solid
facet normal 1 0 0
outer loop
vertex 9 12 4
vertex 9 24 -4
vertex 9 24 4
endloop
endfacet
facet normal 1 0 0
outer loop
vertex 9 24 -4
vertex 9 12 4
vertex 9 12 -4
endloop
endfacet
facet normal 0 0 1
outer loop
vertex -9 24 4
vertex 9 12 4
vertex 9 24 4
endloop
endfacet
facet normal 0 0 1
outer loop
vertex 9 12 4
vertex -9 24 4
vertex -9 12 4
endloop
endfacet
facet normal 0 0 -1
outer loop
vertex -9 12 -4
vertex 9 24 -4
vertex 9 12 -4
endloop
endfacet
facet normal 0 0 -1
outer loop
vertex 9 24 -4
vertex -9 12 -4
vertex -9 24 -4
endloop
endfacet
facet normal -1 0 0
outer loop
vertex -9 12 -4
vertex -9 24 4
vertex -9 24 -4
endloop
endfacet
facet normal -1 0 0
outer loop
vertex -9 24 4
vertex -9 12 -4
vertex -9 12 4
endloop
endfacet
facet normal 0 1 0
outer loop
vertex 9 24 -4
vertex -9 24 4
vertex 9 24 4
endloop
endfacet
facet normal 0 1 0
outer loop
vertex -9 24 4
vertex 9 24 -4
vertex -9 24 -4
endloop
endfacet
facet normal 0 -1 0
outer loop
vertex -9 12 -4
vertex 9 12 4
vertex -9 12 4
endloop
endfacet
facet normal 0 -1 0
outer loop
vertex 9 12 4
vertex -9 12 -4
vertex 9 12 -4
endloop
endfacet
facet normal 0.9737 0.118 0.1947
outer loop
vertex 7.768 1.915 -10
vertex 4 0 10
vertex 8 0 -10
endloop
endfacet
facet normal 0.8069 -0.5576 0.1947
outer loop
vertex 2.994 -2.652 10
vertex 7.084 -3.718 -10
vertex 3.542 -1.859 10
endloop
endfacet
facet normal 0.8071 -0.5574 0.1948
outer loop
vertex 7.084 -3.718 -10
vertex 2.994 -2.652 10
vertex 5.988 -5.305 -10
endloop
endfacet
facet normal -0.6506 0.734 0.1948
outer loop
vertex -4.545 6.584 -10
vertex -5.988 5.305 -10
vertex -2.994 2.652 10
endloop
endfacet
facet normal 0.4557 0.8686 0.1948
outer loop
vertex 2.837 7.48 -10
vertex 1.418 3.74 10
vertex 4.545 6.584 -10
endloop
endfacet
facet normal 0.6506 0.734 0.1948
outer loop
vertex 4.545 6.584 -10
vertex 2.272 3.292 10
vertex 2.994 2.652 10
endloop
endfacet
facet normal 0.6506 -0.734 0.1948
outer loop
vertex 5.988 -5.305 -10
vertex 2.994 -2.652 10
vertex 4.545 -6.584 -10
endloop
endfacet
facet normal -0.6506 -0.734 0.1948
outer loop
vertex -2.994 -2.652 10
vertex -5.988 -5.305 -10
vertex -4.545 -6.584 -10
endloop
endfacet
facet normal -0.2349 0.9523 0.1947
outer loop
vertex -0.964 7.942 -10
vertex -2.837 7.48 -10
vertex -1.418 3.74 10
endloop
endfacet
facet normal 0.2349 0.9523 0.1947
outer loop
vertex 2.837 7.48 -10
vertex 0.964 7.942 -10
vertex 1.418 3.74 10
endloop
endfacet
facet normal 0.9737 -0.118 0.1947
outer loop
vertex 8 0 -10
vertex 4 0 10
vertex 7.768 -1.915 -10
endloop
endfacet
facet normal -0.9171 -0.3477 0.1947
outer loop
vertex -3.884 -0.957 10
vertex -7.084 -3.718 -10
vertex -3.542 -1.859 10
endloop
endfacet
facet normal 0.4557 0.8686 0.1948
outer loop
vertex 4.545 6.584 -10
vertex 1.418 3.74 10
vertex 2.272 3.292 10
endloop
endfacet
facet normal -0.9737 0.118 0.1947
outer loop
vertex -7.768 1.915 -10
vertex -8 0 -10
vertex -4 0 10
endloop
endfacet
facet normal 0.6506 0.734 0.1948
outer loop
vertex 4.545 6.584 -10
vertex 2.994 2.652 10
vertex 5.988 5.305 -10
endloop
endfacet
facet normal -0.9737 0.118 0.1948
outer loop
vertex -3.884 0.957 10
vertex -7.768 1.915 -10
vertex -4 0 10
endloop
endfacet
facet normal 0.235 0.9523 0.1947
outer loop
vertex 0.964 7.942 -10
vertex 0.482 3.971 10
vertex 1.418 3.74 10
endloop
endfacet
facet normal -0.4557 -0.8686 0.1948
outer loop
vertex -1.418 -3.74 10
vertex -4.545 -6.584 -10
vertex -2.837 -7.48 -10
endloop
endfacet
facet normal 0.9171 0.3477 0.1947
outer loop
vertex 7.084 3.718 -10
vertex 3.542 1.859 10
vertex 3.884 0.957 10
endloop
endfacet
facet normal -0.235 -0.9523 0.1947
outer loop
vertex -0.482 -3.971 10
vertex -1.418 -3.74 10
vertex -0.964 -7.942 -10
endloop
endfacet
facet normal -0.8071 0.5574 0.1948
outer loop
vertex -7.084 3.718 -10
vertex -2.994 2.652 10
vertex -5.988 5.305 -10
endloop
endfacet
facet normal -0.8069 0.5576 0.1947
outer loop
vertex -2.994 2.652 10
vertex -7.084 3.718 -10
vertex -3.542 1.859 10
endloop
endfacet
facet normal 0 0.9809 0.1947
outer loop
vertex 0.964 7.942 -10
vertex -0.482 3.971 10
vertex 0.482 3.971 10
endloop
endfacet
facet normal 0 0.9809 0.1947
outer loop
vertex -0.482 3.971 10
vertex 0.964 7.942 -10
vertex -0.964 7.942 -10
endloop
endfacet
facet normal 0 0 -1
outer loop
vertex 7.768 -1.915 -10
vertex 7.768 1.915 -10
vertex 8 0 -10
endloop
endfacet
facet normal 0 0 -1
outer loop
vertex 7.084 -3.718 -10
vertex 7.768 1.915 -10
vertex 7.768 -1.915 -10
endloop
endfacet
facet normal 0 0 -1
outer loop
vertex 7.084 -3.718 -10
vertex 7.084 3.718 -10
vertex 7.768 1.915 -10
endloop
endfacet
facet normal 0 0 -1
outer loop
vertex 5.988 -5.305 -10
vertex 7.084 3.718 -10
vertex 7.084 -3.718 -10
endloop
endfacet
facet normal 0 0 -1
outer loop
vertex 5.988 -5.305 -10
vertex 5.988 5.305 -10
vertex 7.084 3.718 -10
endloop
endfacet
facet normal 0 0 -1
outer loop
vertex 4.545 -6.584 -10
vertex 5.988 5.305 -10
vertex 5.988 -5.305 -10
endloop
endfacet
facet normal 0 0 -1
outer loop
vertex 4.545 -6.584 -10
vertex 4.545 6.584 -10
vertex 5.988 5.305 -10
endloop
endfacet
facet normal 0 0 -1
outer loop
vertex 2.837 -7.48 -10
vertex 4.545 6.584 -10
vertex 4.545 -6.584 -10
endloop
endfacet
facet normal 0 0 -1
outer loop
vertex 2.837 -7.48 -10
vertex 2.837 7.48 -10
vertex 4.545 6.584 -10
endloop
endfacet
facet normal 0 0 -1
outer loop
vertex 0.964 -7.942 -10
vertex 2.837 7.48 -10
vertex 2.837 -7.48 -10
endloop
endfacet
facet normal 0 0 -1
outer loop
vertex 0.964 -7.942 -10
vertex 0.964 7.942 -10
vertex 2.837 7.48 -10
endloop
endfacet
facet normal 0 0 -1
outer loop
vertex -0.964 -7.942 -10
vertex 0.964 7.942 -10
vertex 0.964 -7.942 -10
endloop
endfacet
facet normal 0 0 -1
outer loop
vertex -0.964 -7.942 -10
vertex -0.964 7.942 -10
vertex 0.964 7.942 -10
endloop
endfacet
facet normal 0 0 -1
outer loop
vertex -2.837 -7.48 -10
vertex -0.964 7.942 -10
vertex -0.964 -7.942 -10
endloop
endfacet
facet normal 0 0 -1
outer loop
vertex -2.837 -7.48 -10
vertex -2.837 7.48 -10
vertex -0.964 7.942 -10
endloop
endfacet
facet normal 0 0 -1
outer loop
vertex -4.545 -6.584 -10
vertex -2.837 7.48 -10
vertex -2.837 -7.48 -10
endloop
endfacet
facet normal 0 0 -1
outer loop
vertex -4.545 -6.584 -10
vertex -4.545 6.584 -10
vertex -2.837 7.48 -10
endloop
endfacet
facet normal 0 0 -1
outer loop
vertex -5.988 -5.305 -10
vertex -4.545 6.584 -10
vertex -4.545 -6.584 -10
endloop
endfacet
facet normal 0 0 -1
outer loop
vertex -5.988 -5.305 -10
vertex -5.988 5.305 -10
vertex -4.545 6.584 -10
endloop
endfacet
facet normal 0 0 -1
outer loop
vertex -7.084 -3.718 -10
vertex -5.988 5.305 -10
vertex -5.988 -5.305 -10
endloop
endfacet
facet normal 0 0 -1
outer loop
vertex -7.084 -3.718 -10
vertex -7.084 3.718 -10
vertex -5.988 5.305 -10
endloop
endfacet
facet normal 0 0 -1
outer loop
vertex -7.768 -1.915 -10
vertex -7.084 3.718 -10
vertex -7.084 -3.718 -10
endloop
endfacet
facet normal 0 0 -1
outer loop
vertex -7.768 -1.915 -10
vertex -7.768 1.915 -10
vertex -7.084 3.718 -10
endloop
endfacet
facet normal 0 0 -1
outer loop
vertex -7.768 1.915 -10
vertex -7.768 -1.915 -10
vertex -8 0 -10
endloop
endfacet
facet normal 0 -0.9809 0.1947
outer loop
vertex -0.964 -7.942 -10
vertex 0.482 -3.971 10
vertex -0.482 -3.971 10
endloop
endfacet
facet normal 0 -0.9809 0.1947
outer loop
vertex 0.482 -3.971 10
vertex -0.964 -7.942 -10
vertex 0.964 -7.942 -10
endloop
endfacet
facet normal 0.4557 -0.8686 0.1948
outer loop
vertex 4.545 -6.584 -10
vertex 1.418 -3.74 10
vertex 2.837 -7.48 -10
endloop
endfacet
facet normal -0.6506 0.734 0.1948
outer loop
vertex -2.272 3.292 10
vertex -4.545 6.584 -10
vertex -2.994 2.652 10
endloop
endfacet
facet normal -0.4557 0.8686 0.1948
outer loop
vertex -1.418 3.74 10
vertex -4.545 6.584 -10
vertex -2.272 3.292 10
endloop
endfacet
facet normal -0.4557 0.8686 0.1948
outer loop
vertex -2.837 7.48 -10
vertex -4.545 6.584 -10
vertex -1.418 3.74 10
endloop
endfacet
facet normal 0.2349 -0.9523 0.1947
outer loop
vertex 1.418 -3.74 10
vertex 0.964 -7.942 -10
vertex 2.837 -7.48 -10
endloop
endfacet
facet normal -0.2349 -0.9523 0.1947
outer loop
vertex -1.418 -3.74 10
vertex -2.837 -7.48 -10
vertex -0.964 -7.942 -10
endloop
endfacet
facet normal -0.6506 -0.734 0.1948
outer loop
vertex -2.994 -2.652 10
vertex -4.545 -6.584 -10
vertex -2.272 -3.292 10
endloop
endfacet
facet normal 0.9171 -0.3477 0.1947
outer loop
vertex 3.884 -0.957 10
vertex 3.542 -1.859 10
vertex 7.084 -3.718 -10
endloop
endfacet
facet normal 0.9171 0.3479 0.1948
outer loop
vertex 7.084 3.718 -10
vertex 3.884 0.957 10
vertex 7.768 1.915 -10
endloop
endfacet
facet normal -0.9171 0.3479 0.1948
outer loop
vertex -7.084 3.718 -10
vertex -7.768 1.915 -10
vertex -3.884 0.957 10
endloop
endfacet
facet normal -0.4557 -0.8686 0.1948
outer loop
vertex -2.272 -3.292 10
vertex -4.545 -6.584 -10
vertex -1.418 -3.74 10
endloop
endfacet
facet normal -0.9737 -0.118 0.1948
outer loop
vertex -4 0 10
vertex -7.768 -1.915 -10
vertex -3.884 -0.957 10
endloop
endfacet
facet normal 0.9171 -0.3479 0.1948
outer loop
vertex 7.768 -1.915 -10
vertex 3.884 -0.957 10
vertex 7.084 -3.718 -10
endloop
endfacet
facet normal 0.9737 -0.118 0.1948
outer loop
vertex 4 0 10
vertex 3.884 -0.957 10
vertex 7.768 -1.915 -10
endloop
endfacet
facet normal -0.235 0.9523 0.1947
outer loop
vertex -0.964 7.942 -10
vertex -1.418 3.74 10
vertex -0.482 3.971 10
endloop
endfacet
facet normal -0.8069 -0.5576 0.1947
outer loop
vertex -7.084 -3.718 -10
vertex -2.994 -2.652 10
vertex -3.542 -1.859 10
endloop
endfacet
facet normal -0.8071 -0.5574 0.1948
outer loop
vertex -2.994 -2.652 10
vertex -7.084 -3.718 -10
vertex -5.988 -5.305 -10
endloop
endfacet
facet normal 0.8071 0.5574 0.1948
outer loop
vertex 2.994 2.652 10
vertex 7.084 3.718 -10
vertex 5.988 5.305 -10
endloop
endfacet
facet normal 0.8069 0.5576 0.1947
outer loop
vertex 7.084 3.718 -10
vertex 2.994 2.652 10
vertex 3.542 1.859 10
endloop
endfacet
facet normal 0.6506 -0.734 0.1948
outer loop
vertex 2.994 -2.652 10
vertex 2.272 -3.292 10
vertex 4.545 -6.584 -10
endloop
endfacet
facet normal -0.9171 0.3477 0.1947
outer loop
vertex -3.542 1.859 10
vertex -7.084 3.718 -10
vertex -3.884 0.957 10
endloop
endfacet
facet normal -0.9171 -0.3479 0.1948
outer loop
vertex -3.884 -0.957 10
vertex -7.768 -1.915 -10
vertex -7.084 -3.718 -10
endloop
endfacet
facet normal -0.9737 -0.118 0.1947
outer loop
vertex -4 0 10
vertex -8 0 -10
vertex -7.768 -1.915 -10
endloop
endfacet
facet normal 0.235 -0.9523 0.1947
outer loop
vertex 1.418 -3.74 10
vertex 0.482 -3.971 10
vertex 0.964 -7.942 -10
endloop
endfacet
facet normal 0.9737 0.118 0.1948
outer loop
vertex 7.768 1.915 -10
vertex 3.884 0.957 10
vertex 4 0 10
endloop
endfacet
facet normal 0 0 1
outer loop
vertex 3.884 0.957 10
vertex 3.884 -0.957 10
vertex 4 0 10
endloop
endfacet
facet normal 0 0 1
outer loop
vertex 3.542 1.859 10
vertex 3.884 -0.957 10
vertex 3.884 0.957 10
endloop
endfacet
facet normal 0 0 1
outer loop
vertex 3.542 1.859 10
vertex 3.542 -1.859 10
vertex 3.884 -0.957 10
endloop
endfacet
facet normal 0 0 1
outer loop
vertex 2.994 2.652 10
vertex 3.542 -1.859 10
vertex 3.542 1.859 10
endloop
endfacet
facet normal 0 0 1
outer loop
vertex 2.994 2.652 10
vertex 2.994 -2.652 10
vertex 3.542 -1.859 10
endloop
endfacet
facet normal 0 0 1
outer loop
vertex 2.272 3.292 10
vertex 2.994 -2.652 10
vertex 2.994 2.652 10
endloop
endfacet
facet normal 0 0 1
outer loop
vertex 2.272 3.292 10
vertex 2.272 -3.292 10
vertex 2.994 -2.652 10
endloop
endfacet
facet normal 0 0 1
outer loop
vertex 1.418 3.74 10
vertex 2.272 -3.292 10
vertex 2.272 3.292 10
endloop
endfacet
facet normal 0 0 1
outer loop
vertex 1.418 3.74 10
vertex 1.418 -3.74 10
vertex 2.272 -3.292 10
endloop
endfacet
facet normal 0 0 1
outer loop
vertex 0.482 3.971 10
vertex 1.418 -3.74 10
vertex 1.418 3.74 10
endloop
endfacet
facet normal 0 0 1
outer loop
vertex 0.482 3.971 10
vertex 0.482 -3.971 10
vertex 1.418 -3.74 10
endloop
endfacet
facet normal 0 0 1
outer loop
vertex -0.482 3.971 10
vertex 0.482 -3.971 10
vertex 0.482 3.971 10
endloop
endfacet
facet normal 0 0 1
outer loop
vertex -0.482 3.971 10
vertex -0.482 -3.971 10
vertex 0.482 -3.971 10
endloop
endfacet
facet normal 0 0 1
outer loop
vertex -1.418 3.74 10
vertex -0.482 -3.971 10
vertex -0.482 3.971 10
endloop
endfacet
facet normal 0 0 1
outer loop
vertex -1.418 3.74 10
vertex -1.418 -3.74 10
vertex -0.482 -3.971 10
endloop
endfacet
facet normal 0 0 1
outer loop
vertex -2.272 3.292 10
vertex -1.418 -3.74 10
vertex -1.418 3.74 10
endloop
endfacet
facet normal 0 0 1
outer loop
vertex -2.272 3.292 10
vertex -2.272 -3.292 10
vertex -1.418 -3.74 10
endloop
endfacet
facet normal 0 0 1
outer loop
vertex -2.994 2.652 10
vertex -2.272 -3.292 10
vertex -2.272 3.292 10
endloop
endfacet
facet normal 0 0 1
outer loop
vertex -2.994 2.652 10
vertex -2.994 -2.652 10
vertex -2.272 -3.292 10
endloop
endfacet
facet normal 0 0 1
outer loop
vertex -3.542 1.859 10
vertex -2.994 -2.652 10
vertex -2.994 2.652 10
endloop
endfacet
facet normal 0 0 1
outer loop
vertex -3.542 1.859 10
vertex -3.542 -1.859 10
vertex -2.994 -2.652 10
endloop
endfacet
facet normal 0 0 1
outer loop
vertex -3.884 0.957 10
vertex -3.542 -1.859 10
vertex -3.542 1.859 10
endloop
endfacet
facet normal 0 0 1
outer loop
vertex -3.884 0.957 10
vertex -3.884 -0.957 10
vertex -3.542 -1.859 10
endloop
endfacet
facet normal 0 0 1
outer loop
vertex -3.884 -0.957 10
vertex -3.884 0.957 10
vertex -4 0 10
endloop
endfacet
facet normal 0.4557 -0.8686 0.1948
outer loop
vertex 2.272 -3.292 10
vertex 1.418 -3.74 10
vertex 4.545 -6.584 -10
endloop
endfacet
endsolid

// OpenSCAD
union(){
  translate([0, 18, 0]) cube([18, 12, 8], center=true);
  translate([0, 0, 0]) cylinder(h=20, r1=8, r2=4, center=true);
}
